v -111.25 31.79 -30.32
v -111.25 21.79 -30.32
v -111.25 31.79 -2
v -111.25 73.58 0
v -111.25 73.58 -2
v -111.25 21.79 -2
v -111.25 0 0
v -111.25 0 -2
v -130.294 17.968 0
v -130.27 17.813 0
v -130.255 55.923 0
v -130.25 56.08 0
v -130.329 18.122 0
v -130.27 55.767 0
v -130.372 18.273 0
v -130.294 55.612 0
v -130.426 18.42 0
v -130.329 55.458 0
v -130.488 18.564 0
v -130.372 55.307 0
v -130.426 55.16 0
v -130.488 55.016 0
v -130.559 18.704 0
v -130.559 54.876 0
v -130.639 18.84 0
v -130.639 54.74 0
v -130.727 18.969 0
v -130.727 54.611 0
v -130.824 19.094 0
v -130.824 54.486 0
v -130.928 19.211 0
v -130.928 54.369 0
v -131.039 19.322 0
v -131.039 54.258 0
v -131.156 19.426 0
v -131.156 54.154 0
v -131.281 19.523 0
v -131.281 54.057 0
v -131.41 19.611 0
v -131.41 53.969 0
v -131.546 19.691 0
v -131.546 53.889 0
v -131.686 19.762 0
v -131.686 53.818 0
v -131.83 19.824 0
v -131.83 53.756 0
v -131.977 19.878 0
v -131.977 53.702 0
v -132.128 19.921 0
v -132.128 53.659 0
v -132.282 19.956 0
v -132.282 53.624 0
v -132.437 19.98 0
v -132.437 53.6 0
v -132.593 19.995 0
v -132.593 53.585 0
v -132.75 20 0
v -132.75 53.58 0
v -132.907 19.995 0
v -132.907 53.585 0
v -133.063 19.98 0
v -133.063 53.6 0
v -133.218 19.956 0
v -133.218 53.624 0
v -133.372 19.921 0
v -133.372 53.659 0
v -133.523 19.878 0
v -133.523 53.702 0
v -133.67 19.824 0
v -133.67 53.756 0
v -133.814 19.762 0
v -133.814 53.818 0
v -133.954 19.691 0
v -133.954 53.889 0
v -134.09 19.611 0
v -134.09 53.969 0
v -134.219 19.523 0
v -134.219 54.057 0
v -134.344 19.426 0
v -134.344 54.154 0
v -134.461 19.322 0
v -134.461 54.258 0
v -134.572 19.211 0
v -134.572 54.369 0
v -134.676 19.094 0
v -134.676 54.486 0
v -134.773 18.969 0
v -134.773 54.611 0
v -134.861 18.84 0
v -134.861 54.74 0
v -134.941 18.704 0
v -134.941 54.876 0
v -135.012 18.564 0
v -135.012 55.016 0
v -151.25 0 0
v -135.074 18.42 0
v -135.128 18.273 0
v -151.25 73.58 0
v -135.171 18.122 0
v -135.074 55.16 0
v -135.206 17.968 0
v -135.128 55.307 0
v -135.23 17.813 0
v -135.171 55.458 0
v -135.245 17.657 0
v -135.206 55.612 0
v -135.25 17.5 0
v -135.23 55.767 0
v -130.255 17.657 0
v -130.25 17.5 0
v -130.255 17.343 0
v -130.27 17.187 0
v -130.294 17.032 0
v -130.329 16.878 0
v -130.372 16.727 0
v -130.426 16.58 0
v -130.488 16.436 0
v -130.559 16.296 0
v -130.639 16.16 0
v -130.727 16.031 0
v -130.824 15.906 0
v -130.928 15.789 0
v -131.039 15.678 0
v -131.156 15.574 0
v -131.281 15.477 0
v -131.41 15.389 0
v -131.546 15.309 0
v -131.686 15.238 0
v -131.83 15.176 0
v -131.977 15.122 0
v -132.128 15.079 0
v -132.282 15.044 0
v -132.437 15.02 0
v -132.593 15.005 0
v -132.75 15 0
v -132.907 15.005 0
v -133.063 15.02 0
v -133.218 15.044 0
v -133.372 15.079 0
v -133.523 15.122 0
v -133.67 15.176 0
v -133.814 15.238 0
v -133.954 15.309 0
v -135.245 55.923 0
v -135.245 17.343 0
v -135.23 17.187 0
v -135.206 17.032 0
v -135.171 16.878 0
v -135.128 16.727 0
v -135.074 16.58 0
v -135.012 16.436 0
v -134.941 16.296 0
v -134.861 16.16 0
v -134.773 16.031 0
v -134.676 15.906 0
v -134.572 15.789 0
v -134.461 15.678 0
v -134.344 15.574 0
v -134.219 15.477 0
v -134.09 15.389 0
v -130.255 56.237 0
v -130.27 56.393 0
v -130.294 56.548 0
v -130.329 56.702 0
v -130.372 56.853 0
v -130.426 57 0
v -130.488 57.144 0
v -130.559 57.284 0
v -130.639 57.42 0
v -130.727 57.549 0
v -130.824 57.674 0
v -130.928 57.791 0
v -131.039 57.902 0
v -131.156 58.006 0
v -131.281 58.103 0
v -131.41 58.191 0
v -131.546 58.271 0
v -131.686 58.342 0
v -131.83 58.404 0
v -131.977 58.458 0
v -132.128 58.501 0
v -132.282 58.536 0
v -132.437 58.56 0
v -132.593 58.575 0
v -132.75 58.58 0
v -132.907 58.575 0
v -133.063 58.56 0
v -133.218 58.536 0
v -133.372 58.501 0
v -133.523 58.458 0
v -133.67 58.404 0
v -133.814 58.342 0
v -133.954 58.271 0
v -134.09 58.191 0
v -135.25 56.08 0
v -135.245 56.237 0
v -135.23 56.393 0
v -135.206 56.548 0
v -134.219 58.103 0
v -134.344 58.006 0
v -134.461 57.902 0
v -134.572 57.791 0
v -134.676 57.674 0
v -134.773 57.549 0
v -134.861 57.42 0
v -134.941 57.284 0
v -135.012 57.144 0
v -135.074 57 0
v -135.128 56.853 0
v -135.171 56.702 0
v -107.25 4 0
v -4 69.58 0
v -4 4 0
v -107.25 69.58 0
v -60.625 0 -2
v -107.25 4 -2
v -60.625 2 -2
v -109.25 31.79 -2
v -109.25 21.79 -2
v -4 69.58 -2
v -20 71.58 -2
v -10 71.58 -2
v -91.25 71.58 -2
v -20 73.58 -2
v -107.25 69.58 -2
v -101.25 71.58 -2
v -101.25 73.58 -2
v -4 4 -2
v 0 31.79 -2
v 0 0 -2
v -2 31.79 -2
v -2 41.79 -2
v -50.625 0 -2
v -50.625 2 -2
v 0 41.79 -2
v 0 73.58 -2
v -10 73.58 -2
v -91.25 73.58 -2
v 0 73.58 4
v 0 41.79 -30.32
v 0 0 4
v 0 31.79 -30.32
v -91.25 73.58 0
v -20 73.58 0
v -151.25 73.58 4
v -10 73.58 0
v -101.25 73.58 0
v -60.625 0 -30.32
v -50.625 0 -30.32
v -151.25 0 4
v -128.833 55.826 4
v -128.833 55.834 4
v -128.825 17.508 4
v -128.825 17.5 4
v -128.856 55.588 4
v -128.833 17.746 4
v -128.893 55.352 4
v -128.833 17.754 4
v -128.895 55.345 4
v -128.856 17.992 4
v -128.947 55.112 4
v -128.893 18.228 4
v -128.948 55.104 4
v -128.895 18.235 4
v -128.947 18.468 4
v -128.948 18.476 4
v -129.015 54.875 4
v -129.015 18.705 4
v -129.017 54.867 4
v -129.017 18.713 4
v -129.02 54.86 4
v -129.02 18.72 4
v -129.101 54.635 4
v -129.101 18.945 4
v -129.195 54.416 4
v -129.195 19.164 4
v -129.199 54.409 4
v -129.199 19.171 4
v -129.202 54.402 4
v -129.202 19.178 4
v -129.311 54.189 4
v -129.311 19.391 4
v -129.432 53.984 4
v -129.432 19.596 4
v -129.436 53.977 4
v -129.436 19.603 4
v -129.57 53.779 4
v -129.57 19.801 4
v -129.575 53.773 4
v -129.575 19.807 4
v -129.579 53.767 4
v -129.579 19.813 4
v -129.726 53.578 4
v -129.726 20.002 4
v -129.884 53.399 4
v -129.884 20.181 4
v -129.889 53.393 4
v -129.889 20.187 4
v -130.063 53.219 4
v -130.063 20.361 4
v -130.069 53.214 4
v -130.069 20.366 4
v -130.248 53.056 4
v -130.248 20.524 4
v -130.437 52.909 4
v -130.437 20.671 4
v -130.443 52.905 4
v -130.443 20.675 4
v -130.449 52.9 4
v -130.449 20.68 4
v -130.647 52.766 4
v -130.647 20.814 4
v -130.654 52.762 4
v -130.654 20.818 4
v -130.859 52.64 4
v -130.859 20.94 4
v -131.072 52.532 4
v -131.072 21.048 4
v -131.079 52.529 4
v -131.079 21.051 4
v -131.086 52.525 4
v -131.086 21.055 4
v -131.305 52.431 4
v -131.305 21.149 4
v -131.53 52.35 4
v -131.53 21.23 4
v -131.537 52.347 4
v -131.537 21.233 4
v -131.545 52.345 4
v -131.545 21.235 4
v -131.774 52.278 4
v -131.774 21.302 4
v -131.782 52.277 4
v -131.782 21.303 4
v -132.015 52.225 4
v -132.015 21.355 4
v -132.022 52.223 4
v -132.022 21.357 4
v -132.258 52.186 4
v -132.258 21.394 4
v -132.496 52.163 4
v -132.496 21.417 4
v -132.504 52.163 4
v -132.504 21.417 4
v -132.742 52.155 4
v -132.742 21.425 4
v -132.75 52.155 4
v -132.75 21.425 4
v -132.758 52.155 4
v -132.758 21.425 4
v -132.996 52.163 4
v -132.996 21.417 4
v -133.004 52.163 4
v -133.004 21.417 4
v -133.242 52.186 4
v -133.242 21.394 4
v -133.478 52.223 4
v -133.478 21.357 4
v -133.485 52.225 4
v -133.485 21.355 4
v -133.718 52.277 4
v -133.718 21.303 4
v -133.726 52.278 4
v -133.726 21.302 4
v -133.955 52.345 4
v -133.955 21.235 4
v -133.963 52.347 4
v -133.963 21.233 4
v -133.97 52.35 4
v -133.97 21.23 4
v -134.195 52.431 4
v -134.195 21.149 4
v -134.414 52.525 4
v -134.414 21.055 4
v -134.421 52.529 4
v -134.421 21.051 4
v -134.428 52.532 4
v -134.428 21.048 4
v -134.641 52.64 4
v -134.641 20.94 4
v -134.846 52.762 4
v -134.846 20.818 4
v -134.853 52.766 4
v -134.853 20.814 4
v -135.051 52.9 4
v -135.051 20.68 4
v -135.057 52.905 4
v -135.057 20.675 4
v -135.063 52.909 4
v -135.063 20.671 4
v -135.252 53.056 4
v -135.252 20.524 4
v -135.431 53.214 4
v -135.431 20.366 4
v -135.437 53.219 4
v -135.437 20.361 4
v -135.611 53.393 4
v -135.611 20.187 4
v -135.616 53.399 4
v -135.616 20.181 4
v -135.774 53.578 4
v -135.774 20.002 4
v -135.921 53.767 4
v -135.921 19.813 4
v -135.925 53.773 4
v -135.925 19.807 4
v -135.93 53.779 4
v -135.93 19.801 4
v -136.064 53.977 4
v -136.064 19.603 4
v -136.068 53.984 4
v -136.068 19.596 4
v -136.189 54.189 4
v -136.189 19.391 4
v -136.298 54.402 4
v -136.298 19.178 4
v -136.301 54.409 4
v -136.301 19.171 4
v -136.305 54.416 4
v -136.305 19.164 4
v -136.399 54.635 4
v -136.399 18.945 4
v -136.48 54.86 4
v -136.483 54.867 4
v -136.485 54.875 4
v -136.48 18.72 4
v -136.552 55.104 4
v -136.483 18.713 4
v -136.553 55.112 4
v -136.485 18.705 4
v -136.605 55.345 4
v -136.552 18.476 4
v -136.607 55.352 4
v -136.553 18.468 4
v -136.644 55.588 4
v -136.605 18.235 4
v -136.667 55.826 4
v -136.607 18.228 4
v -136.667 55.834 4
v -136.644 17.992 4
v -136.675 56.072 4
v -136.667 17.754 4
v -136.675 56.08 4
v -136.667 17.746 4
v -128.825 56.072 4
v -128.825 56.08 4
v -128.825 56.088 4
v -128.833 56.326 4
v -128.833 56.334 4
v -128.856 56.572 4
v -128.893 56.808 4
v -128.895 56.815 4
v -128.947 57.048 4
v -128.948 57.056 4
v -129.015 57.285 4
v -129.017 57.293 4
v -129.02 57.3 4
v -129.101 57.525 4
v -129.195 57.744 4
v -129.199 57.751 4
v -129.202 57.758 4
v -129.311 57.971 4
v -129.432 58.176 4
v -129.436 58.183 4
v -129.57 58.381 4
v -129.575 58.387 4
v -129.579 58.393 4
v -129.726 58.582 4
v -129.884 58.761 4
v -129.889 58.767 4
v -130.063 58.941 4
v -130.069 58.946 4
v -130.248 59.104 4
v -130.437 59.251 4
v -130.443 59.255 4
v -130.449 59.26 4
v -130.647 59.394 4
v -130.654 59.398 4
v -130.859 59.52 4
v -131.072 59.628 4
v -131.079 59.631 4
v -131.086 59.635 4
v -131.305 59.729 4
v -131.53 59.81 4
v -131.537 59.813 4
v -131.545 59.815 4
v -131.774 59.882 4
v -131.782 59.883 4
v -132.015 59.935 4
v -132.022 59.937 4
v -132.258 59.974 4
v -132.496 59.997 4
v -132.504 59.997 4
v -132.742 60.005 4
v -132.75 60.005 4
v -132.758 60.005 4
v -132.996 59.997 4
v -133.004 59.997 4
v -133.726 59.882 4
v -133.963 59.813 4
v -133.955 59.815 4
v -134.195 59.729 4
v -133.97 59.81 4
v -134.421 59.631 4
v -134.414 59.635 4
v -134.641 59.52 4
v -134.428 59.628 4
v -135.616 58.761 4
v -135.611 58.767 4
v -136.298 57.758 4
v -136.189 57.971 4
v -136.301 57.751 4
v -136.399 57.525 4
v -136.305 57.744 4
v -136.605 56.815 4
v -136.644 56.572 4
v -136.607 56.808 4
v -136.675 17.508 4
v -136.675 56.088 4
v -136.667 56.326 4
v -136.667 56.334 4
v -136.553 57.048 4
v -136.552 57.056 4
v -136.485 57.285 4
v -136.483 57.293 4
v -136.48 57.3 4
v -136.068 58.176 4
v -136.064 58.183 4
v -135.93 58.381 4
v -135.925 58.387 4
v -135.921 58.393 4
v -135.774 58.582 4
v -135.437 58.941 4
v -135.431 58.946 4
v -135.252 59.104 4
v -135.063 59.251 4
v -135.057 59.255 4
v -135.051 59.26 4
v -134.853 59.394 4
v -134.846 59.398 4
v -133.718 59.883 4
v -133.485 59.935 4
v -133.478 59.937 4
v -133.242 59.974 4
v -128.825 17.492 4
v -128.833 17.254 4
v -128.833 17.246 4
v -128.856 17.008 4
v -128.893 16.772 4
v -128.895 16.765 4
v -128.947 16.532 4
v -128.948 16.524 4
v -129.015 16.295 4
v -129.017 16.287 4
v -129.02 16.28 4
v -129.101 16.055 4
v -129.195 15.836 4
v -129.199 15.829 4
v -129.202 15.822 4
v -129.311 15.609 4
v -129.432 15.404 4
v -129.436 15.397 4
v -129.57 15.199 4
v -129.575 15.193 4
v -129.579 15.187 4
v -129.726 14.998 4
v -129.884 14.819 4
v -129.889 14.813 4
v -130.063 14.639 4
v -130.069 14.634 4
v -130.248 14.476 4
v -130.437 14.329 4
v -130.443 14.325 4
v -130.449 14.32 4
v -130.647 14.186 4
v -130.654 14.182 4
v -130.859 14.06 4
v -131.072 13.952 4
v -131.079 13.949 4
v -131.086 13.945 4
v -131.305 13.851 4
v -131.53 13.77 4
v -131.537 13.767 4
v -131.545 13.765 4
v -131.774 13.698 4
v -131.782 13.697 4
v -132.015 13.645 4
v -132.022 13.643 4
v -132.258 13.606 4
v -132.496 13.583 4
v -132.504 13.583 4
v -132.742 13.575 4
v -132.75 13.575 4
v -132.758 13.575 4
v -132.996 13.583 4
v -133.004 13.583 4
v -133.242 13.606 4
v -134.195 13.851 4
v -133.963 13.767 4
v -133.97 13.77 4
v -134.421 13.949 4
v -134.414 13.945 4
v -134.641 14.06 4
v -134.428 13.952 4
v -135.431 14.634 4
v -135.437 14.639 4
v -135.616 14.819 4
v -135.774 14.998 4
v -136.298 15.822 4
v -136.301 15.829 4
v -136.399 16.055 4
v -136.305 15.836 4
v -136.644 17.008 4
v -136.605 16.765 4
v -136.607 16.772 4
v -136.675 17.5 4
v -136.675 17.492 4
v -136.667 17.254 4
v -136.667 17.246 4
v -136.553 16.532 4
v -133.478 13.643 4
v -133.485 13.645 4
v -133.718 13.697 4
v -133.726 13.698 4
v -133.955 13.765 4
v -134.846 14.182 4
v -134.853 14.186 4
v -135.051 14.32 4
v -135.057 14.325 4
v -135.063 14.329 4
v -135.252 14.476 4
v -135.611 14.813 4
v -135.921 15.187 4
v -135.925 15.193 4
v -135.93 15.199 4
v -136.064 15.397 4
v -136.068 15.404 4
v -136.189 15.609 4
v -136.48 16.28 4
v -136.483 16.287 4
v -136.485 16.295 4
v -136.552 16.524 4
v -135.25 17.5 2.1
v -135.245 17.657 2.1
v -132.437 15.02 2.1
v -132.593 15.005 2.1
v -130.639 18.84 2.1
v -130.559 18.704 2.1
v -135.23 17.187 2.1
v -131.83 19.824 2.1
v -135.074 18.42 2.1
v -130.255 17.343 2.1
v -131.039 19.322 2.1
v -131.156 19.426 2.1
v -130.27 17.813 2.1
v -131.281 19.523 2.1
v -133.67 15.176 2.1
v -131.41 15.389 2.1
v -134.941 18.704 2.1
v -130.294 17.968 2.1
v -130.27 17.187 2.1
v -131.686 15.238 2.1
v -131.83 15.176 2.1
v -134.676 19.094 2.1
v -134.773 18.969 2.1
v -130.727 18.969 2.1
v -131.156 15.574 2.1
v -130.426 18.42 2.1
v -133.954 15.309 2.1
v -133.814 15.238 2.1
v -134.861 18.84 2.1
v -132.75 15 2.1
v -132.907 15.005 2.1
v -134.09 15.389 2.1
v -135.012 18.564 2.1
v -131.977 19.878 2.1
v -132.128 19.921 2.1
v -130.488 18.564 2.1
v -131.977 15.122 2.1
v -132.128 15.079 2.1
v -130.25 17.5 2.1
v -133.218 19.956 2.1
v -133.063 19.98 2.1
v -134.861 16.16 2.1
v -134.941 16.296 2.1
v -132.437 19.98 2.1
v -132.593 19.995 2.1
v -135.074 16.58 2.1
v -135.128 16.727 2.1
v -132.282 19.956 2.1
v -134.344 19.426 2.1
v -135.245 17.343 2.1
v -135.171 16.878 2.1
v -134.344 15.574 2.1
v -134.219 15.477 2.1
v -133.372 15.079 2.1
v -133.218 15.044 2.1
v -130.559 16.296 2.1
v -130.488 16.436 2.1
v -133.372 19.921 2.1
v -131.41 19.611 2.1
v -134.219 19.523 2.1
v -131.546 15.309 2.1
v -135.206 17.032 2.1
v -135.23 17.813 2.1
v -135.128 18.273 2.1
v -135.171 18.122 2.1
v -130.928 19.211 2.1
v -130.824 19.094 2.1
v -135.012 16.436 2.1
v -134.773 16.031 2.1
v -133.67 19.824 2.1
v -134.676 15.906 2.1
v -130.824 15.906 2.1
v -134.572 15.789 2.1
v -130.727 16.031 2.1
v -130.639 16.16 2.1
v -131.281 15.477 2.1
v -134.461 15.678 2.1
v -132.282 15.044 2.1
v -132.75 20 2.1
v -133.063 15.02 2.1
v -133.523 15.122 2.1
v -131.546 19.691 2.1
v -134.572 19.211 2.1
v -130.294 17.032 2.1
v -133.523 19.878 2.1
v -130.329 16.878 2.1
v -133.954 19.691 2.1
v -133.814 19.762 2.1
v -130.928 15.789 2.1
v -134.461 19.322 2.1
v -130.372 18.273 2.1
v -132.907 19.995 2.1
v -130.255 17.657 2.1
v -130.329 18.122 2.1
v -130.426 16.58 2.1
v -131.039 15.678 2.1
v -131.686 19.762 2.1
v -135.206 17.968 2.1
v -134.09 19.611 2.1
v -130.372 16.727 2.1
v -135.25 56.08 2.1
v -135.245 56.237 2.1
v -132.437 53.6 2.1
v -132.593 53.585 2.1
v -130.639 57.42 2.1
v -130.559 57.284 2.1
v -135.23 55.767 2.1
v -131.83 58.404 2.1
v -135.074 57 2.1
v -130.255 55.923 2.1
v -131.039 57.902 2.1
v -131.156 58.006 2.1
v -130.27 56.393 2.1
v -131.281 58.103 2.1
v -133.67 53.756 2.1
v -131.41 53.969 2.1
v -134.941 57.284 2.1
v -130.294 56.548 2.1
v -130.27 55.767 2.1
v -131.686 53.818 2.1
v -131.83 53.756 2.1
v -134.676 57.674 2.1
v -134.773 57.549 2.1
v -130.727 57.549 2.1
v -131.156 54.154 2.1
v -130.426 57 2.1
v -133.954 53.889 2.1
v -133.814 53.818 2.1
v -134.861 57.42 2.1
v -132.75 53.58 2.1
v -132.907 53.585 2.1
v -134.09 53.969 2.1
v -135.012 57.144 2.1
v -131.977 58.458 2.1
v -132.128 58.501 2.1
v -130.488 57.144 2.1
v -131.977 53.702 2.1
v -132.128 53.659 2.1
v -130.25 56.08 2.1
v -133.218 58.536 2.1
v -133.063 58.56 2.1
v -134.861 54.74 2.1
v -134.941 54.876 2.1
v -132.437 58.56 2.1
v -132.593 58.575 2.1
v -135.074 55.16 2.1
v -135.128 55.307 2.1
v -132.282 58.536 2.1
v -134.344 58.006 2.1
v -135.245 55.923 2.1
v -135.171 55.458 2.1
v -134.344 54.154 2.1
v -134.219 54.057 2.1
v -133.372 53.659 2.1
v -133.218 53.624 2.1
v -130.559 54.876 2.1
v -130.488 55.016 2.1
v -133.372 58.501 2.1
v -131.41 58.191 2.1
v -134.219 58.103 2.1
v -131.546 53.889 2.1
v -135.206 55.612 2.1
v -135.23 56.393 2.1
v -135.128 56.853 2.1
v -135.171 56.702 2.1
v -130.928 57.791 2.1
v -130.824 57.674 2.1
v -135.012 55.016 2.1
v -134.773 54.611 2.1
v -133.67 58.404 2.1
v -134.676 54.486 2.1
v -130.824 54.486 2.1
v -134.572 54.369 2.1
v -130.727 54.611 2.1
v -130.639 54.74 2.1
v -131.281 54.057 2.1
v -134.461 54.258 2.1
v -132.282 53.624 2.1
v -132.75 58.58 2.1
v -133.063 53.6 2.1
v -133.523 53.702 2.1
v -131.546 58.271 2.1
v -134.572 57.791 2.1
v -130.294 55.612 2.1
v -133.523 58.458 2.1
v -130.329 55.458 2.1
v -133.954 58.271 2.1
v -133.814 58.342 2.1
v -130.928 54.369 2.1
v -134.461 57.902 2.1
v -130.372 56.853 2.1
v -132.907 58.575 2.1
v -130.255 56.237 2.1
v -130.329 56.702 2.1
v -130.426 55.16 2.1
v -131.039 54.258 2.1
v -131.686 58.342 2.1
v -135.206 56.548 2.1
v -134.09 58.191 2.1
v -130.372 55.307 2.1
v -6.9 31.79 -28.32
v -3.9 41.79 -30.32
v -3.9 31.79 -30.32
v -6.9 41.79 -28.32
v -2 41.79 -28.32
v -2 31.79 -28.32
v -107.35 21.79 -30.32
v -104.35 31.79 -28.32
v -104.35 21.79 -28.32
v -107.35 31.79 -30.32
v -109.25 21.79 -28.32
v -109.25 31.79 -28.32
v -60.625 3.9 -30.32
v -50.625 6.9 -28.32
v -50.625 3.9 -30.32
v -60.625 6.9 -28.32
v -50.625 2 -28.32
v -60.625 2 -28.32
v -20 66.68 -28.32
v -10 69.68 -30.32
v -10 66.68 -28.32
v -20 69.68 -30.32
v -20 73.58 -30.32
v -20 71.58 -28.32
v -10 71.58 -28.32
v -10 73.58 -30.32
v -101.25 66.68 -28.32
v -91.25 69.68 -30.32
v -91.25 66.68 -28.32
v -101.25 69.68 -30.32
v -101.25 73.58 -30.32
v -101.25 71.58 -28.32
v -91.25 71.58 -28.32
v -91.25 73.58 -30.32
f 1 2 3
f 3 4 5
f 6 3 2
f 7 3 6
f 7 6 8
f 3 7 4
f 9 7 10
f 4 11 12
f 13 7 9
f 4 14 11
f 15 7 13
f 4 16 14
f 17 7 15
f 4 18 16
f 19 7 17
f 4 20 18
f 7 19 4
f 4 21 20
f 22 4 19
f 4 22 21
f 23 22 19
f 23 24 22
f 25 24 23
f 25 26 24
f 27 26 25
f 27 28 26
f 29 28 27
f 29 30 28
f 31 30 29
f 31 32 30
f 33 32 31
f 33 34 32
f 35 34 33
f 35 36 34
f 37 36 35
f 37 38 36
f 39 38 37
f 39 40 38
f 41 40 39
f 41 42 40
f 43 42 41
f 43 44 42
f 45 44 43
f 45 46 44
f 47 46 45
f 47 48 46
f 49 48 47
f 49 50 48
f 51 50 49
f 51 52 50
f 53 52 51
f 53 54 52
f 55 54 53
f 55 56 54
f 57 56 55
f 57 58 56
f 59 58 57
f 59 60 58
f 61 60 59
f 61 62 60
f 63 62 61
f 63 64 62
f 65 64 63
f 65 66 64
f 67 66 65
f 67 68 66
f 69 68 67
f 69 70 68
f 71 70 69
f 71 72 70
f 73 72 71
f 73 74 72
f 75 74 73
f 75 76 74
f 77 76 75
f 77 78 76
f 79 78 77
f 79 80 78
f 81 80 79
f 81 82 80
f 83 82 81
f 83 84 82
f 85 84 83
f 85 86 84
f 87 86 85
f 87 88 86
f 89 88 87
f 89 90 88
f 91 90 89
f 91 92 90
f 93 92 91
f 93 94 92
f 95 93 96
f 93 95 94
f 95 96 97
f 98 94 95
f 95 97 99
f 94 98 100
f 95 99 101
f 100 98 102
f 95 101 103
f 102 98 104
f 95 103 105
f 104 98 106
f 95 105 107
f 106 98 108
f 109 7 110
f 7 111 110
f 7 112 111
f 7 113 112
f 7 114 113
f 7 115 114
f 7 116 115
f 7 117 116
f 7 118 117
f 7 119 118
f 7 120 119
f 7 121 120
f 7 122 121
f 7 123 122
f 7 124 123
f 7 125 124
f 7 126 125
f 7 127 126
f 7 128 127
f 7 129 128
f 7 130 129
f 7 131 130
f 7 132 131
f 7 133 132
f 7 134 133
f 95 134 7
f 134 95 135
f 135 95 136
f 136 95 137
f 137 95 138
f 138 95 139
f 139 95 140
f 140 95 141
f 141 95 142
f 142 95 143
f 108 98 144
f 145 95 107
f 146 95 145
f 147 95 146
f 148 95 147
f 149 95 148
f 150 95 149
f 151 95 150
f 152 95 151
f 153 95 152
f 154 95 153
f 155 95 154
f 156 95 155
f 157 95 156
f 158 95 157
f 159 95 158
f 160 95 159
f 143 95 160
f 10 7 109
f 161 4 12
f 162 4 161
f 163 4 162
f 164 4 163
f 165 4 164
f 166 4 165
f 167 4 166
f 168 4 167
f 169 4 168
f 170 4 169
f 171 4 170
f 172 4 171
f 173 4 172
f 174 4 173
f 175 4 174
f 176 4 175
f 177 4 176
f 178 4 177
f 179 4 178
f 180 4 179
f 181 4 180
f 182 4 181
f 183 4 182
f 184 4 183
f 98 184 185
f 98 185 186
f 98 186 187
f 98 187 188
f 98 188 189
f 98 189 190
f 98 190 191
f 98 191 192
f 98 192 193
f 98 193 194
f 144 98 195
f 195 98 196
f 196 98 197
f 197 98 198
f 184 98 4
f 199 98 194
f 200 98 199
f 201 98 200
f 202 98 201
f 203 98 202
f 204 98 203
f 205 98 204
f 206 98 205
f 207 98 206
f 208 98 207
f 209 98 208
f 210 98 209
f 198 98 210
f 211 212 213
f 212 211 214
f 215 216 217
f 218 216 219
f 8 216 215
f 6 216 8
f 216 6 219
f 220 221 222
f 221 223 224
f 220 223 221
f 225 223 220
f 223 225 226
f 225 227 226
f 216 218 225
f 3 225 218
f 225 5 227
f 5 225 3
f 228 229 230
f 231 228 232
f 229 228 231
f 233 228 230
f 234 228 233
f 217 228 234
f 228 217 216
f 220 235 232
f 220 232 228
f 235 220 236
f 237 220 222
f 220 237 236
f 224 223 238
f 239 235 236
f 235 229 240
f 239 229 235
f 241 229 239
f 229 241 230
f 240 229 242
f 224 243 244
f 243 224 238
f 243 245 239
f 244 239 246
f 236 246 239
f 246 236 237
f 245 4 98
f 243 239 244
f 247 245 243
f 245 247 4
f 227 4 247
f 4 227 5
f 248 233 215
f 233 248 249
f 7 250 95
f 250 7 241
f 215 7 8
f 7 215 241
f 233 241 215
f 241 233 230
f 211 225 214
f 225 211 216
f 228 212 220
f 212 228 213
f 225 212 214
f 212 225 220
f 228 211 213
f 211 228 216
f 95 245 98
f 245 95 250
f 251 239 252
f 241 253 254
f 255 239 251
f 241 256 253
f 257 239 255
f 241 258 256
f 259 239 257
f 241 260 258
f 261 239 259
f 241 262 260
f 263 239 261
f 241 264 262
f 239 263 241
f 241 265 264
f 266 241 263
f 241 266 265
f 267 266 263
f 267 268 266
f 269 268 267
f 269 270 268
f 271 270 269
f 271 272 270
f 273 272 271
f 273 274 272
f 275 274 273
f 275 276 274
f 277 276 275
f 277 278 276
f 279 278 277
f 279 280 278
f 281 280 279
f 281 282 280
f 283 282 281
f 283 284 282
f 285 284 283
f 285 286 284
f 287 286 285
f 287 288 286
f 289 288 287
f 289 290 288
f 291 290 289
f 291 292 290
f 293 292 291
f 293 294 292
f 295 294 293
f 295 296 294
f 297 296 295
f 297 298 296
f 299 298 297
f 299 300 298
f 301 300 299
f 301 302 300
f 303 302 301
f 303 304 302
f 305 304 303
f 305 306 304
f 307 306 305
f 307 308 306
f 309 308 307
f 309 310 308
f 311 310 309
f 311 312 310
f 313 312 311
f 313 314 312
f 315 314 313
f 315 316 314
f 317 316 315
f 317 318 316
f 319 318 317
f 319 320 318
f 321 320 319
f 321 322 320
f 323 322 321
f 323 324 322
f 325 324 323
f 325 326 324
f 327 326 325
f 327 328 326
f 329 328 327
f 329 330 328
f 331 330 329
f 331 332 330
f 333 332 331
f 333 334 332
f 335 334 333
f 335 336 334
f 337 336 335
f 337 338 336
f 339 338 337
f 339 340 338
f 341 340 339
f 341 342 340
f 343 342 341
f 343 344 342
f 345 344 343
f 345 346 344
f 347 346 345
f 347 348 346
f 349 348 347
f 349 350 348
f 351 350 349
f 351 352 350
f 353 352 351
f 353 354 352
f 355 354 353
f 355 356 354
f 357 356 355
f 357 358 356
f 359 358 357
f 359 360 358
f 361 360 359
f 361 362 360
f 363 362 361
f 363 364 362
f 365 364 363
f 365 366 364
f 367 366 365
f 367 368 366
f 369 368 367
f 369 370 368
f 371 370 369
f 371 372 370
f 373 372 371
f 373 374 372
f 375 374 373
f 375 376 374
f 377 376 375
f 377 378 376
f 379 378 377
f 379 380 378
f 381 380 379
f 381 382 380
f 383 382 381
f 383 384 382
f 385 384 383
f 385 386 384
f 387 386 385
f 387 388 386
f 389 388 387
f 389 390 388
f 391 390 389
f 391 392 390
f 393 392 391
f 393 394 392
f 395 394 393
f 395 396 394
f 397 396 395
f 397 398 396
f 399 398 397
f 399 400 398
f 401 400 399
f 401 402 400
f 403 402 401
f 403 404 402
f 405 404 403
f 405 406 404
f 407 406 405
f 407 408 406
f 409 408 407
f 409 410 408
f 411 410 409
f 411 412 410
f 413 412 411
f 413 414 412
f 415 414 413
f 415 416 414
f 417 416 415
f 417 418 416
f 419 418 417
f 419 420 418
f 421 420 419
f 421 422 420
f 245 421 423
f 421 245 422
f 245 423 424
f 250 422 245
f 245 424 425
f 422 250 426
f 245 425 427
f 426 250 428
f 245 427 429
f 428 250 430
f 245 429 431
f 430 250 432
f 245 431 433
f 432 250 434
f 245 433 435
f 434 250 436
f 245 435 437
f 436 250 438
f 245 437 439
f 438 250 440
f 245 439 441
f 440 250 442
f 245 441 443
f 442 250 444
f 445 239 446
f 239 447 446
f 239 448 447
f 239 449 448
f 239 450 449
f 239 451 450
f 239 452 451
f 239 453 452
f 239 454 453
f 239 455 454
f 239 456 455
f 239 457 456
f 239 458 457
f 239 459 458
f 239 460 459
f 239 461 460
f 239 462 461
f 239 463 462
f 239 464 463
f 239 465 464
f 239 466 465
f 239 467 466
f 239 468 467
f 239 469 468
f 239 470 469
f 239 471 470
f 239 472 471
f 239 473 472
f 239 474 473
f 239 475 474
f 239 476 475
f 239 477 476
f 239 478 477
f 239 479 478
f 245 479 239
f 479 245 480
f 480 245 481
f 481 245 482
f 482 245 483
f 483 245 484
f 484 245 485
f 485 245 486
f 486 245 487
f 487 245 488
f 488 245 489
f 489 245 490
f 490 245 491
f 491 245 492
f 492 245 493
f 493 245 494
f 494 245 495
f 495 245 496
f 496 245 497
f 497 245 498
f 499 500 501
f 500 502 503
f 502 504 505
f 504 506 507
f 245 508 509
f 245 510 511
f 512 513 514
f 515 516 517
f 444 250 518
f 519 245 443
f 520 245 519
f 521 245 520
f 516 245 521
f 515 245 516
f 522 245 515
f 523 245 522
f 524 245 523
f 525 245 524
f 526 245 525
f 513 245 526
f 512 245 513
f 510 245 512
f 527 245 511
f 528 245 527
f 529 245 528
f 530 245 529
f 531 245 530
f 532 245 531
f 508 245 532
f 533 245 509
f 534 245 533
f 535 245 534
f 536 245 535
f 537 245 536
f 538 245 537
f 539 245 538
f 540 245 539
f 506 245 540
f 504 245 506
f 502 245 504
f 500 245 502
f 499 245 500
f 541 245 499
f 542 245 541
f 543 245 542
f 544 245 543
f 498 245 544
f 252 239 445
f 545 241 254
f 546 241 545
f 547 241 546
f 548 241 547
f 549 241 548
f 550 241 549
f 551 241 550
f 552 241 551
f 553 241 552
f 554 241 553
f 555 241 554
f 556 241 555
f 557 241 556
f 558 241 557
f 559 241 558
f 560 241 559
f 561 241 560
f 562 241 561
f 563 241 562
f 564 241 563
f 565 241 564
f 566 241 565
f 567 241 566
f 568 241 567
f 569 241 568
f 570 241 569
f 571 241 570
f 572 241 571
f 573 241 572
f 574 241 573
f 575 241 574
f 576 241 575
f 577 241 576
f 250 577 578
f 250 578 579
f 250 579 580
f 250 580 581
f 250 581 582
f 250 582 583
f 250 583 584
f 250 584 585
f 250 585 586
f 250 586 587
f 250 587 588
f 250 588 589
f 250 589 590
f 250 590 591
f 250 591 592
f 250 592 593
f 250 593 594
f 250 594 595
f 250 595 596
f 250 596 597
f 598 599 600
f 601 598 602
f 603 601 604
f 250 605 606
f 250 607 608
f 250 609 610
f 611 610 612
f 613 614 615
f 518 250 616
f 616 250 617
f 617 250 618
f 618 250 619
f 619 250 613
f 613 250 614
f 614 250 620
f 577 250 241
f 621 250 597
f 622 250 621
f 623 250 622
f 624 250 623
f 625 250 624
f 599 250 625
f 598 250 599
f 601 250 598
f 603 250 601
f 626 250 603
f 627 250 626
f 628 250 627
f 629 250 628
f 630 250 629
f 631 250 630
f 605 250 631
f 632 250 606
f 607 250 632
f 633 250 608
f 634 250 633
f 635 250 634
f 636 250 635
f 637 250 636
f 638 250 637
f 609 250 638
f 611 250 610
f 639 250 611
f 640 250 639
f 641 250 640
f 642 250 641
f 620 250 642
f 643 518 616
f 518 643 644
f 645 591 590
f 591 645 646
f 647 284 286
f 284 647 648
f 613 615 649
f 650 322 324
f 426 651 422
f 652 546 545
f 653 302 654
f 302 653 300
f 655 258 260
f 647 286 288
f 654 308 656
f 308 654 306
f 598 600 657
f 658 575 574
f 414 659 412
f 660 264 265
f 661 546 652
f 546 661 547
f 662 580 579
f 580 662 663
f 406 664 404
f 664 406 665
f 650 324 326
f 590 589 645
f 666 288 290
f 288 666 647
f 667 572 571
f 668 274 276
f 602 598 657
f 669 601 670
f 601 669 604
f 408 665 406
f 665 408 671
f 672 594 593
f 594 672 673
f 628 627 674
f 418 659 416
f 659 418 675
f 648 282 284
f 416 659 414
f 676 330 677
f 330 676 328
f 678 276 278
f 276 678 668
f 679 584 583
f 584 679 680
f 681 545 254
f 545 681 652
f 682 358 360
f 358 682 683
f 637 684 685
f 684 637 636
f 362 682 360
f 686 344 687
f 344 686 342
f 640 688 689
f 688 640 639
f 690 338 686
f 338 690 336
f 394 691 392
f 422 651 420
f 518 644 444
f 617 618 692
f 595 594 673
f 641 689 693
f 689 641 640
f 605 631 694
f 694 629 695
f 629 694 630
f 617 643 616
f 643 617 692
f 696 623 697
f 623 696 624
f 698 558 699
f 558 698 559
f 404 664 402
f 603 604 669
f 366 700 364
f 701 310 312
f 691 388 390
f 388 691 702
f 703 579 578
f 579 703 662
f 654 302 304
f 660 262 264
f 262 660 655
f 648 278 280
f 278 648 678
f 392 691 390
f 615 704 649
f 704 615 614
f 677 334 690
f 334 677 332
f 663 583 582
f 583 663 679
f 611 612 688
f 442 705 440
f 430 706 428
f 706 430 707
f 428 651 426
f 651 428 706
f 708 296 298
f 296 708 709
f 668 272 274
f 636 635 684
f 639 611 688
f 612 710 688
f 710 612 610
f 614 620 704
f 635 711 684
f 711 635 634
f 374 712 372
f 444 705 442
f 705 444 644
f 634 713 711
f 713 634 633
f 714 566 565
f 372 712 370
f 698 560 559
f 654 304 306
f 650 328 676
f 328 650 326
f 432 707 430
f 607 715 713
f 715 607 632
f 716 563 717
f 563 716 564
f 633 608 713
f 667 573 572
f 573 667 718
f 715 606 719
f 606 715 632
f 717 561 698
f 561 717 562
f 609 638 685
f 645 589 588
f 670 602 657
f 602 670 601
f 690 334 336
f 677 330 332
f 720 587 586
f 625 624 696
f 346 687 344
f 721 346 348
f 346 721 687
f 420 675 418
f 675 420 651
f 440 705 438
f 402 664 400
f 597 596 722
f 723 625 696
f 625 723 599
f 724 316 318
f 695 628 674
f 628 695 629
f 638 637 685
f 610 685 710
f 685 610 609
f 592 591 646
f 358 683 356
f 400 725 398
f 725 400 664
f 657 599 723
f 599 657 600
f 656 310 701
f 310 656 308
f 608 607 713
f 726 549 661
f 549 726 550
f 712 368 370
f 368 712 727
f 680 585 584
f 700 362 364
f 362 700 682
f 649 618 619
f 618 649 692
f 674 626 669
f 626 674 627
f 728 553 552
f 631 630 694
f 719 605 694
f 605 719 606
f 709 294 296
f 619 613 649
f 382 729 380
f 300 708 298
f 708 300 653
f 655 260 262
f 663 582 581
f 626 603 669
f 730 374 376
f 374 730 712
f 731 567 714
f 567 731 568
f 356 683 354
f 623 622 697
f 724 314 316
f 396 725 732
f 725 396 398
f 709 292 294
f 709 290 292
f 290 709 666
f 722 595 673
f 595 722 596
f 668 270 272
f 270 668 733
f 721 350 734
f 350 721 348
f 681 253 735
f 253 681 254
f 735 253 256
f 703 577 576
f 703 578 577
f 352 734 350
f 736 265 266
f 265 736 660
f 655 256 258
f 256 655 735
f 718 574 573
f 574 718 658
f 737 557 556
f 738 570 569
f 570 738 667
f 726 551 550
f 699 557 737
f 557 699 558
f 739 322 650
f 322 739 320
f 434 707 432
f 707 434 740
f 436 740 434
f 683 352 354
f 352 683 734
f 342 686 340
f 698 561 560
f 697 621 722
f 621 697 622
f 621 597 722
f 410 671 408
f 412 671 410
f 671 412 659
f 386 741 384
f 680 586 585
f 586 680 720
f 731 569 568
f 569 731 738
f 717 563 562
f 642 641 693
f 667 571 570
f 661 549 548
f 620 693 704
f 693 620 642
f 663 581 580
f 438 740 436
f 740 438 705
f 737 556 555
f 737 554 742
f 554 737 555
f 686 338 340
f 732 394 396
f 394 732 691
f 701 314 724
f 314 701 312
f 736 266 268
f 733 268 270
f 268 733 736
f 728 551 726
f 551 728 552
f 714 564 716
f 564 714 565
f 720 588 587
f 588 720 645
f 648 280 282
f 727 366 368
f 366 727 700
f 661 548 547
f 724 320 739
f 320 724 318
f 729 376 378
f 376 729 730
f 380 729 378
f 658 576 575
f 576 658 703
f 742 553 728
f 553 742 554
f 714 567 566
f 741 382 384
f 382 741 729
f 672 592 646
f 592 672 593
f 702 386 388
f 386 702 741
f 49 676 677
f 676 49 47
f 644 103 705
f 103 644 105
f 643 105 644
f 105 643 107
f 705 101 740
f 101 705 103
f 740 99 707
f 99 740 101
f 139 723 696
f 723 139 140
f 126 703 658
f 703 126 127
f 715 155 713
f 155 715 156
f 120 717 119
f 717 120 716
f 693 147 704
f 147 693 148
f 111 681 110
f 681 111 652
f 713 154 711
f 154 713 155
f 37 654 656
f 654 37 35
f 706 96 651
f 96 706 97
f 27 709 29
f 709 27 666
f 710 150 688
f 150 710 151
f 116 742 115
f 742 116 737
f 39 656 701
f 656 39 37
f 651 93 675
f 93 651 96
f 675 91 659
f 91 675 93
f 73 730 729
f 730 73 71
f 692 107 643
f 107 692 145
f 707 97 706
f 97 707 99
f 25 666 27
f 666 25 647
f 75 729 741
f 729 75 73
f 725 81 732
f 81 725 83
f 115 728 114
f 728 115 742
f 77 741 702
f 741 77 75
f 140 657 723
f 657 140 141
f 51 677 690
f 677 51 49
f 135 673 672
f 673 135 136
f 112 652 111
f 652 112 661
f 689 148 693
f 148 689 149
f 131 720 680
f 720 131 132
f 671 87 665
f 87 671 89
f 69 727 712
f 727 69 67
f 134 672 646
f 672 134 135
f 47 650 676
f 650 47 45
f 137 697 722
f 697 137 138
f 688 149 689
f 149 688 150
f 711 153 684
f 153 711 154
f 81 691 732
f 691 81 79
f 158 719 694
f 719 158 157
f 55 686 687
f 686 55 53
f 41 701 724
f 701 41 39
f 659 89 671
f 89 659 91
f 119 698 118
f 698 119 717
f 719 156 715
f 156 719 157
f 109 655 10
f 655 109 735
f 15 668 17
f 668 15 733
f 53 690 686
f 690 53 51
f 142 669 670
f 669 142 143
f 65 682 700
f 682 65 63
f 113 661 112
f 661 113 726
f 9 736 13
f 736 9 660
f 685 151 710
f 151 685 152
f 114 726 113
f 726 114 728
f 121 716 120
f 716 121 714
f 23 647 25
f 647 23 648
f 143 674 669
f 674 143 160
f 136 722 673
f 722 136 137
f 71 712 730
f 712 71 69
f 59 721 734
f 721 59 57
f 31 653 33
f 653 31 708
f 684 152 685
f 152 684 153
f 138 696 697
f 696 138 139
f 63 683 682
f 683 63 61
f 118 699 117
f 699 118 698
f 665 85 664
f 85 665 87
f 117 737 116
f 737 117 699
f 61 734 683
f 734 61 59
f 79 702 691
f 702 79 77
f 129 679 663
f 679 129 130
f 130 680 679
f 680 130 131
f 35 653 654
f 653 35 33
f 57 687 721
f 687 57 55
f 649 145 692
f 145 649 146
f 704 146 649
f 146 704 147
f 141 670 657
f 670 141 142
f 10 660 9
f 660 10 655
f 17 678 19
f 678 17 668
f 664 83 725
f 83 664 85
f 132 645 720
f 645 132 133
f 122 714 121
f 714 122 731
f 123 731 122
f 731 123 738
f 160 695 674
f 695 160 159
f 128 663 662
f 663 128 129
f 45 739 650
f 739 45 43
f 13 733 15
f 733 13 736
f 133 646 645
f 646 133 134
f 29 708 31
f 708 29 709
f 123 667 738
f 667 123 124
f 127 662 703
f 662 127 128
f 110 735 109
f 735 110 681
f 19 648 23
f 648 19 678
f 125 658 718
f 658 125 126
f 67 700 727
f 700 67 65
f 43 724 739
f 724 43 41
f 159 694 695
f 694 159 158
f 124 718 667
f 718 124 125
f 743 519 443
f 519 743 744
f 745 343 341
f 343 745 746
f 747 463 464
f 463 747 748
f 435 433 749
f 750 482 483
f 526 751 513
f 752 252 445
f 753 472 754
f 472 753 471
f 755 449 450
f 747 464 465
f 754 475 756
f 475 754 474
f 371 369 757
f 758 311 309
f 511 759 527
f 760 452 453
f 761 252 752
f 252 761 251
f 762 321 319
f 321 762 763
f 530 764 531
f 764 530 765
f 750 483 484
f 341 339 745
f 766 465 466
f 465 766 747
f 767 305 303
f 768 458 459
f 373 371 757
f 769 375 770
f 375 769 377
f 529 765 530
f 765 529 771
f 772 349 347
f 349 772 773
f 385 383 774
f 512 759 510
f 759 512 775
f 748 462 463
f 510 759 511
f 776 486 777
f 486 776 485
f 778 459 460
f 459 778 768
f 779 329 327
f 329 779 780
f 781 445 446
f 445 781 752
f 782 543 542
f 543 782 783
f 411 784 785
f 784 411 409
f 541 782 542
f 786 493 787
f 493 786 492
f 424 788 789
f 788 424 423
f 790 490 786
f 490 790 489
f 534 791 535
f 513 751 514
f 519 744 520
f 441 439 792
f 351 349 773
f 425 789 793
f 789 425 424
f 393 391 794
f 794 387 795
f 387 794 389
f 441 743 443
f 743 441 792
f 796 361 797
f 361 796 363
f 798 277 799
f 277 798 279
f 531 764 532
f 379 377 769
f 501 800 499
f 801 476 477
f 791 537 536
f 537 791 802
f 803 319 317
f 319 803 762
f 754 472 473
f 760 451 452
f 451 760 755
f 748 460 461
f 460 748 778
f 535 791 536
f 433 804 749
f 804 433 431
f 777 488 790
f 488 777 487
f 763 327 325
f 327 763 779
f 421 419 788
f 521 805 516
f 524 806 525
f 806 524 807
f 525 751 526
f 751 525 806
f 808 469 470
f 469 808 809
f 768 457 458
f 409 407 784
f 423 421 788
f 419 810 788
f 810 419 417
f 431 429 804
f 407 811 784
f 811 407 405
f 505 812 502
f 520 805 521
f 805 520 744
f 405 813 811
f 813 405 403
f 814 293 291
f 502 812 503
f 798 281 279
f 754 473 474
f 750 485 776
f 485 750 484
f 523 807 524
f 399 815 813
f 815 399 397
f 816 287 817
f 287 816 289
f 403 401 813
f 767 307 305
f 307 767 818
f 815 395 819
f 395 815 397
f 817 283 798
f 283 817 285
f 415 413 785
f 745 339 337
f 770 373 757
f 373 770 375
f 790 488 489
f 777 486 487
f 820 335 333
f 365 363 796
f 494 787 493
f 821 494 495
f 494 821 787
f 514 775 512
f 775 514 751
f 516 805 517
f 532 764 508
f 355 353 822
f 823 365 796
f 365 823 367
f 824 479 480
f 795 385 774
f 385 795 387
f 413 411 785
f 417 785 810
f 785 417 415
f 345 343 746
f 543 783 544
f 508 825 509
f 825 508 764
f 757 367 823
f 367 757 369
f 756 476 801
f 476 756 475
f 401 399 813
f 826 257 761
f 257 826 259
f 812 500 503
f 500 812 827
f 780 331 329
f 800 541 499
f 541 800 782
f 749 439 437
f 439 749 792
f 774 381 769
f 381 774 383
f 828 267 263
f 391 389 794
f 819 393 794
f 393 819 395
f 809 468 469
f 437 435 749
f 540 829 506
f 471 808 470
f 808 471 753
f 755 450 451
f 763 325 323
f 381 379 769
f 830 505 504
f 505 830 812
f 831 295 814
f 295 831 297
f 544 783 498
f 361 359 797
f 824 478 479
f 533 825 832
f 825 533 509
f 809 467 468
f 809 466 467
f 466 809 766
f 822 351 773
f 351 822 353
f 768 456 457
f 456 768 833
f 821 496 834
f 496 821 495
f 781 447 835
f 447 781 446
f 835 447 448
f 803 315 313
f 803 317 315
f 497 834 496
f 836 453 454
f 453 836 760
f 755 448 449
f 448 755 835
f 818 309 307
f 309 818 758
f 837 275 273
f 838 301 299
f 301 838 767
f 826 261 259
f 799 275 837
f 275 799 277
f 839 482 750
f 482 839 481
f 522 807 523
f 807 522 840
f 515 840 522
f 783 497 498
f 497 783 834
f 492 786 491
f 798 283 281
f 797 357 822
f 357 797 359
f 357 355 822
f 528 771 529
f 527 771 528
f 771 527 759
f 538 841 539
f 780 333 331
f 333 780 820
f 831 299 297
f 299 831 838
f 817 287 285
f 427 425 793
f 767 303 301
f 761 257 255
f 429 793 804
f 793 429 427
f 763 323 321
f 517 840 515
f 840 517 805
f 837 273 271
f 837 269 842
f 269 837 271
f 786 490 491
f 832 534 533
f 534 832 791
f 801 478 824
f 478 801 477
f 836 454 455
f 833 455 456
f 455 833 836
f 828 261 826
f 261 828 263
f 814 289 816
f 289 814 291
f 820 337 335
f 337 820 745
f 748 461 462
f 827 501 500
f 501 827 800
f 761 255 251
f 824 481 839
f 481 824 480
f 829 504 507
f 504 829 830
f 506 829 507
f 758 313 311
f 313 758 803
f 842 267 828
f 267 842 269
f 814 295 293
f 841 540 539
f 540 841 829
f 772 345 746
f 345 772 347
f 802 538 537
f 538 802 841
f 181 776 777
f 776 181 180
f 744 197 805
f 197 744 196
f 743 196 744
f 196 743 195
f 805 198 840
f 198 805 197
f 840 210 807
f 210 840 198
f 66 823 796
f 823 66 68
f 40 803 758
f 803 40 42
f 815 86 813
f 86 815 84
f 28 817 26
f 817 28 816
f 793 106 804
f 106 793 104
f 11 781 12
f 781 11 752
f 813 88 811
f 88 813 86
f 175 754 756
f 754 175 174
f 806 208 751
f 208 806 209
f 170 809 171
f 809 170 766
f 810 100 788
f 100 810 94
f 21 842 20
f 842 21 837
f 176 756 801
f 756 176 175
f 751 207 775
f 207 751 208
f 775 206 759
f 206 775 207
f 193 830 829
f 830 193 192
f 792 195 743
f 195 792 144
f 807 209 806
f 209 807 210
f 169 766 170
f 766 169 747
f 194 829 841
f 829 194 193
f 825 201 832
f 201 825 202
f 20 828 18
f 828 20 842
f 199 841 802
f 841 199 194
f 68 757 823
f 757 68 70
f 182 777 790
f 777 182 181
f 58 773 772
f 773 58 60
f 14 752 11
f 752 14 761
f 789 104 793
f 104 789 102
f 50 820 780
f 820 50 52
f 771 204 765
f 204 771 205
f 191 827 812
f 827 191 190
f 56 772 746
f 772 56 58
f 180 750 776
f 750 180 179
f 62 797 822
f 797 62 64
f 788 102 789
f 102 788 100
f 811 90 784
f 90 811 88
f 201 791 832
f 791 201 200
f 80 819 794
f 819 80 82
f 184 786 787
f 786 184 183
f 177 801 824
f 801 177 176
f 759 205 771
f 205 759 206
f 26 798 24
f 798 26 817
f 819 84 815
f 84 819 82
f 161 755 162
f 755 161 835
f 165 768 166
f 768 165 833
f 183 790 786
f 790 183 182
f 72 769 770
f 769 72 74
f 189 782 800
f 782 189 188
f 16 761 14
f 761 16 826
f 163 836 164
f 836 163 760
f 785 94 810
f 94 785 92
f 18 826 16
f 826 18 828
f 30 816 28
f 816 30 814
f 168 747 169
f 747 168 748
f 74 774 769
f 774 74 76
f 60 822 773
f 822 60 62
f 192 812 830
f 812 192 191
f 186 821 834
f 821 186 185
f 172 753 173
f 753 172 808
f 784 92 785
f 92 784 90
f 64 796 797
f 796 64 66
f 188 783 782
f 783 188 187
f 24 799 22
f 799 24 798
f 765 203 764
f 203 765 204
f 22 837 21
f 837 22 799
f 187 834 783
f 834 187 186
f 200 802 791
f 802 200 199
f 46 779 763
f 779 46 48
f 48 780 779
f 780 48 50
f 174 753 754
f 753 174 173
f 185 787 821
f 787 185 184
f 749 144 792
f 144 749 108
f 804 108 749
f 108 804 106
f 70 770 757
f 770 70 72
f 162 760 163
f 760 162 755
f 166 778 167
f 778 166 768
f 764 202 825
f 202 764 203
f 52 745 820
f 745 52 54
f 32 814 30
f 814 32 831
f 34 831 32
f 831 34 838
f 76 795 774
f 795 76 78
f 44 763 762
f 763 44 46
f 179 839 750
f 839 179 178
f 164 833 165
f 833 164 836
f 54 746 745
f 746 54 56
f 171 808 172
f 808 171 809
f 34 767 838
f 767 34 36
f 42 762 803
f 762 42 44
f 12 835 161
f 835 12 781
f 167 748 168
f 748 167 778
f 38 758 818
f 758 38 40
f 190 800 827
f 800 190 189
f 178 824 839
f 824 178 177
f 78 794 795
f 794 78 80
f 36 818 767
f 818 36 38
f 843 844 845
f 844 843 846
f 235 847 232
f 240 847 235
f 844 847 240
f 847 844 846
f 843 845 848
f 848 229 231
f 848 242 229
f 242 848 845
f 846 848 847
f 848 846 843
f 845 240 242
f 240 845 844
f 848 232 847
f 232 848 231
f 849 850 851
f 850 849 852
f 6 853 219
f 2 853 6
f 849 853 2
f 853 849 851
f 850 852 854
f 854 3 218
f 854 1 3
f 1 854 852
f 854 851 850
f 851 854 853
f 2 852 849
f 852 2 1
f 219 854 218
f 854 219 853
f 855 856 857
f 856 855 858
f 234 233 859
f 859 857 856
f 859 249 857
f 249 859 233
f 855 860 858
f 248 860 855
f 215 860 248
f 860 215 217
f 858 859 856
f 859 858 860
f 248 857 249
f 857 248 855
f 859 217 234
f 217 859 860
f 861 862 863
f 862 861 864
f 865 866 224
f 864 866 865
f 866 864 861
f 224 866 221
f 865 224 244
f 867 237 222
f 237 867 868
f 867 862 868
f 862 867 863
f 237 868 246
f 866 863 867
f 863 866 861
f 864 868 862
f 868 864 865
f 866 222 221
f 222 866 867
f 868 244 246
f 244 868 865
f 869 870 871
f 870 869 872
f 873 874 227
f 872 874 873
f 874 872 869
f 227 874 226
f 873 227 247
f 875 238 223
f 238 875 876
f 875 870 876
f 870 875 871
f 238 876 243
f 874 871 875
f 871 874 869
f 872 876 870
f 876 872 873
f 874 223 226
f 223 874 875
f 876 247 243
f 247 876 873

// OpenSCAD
// Holder for Jaeco DC Pump Controller

// Parameters

screws_position = 1; // values: 0 for "right", 1 for "left"

holder_thickness = 4;
holder_mount_width = 40;

holder_handle_thickness = 2;
holder_handle_width = 10;
holder_handle_length = 3;

controller_x = 107.25;
controller_y = 69.58;
controller_z = 26.32;

bolt_diameter      = 5;
bolt_head_diameter = 8;
bolt_head_height   = 2;
bolt_position      = 15;

frame_height = 2;

// Calculations
base_x  = controller_x + 2 * holder_handle_thickness;
base_y = controller_y + 2 * holder_handle_thickness;

total_x = base_x + holder_mount_width;

bolt_r = bolt_diameter / 2;
bolt_center = total_x - holder_mount_width / 2 - bolt_diameter / 2 + holder_handle_thickness * 2;

/**
 * run()
 */
run();
//debug();

/**
 * modules
 */
module debug() {
    m = [holder_handle_thickness,holder_handle_thickness,0-controller_z - frame_height];
    mirror([ screws_position, 0, 0 ])
    color([1,0,0])
        translate(m)
            cube([controller_x,controller_y,controller_z]);
}

module run() {
    mirror([ screws_position, 0, 0 ]) {
        difference() {
            union() {
                cube([total_x,base_y,holder_thickness]);
                frame();
            }
            bolts();
        }
        paws();
    }
}

module frame() {

    translate([0,0,-holder_handle_thickness]) {
        difference() {
            cube([controller_x+2*holder_handle_thickness,controller_y+2*holder_handle_thickness, frame_height]);
            translate([holder_handle_thickness+2,holder_handle_thickness+2,-.1]) {
                cube([controller_x-4,controller_y-4, frame_height+.2]);
            }
        }
    }
}

module bolts() {
    translate([bolt_center,0,-.1]) {
        translate([0,bolt_position + bolt_diameter / 2,0]) {
            bolt();
        }
        translate([0,base_y - bolt_position - bolt_diameter / 2,0]) {
            bolt();
        }
    }
}

module paws() {
    translate([0,base_y/2-holder_handle_width/2,0] ) {
        paw();
    }
    translate([base_x,base_y/2-holder_handle_width/2,0] ) {
        rotate([0,0,180]) {
            paw();
        }
    }
    translate([base_x/2+holder_handle_width/2,0,0] ) {
        rotate([0,0,90]) {
            paw();
        }
    }
    offset = 10;
    translate([offset,base_y,0] ) {
        rotate([0,0,-90]) {
            paw();
        }
    }
    x = controller_x-offset-holder_handle_width + 2 * holder_handle_thickness;
    translate([x,base_y,0] ) {
        rotate([0,0,-90]) {
            paw();
        }
    }
}

module paw() {
    z = controller_z + holder_thickness;
    translate([0,0,-z]) {
        union() {
            cube([holder_handle_thickness, holder_handle_width, z ]);
            hprism();
        }
    }
}

module bolt() {
    union() {
        translate( [0,0,holder_thickness - bolt_head_height + .2] ) {
        cylinder( h = bolt_head_height, r2 = bolt_head_diameter / 2, r1 = bolt_r, $fn=100 );
        }
        cylinder( h = holder_thickness + .2, r = bolt_r, $fn=100 );
    }
}       
module hprism() {
        l = holder_handle_width;
        h = holder_handle_length;
        w = holder_handle_thickness;
        translate([holder_handle_thickness-.1,0,0] ) {
            union() {
                translate([holder_handle_thickness,0,0] ) {
                    rotate([90,0,90]) {
                        prism( l, w, h );
                    }
                }
                cube([w,l,w]);
            }
        }
}

module prism(l, w, h) {
    polyhedron(// pt      0        1        2        3        4        5
               points=[[0,0,0], [0,w,h], [l,w,h], [l,0,0], [0,w,0], [l,w,0]],
               // top sloping face (A)
               faces=[[0,1,2,3],
               // vertical rectangular face (B)
               [2,1,4,5],
               // bottom face (C)
               [0,3,5,4],
               // rear triangular face (D)
               [0,4,1],
               // front triangular face (E)
               [3,2,5]]
               );
    }
